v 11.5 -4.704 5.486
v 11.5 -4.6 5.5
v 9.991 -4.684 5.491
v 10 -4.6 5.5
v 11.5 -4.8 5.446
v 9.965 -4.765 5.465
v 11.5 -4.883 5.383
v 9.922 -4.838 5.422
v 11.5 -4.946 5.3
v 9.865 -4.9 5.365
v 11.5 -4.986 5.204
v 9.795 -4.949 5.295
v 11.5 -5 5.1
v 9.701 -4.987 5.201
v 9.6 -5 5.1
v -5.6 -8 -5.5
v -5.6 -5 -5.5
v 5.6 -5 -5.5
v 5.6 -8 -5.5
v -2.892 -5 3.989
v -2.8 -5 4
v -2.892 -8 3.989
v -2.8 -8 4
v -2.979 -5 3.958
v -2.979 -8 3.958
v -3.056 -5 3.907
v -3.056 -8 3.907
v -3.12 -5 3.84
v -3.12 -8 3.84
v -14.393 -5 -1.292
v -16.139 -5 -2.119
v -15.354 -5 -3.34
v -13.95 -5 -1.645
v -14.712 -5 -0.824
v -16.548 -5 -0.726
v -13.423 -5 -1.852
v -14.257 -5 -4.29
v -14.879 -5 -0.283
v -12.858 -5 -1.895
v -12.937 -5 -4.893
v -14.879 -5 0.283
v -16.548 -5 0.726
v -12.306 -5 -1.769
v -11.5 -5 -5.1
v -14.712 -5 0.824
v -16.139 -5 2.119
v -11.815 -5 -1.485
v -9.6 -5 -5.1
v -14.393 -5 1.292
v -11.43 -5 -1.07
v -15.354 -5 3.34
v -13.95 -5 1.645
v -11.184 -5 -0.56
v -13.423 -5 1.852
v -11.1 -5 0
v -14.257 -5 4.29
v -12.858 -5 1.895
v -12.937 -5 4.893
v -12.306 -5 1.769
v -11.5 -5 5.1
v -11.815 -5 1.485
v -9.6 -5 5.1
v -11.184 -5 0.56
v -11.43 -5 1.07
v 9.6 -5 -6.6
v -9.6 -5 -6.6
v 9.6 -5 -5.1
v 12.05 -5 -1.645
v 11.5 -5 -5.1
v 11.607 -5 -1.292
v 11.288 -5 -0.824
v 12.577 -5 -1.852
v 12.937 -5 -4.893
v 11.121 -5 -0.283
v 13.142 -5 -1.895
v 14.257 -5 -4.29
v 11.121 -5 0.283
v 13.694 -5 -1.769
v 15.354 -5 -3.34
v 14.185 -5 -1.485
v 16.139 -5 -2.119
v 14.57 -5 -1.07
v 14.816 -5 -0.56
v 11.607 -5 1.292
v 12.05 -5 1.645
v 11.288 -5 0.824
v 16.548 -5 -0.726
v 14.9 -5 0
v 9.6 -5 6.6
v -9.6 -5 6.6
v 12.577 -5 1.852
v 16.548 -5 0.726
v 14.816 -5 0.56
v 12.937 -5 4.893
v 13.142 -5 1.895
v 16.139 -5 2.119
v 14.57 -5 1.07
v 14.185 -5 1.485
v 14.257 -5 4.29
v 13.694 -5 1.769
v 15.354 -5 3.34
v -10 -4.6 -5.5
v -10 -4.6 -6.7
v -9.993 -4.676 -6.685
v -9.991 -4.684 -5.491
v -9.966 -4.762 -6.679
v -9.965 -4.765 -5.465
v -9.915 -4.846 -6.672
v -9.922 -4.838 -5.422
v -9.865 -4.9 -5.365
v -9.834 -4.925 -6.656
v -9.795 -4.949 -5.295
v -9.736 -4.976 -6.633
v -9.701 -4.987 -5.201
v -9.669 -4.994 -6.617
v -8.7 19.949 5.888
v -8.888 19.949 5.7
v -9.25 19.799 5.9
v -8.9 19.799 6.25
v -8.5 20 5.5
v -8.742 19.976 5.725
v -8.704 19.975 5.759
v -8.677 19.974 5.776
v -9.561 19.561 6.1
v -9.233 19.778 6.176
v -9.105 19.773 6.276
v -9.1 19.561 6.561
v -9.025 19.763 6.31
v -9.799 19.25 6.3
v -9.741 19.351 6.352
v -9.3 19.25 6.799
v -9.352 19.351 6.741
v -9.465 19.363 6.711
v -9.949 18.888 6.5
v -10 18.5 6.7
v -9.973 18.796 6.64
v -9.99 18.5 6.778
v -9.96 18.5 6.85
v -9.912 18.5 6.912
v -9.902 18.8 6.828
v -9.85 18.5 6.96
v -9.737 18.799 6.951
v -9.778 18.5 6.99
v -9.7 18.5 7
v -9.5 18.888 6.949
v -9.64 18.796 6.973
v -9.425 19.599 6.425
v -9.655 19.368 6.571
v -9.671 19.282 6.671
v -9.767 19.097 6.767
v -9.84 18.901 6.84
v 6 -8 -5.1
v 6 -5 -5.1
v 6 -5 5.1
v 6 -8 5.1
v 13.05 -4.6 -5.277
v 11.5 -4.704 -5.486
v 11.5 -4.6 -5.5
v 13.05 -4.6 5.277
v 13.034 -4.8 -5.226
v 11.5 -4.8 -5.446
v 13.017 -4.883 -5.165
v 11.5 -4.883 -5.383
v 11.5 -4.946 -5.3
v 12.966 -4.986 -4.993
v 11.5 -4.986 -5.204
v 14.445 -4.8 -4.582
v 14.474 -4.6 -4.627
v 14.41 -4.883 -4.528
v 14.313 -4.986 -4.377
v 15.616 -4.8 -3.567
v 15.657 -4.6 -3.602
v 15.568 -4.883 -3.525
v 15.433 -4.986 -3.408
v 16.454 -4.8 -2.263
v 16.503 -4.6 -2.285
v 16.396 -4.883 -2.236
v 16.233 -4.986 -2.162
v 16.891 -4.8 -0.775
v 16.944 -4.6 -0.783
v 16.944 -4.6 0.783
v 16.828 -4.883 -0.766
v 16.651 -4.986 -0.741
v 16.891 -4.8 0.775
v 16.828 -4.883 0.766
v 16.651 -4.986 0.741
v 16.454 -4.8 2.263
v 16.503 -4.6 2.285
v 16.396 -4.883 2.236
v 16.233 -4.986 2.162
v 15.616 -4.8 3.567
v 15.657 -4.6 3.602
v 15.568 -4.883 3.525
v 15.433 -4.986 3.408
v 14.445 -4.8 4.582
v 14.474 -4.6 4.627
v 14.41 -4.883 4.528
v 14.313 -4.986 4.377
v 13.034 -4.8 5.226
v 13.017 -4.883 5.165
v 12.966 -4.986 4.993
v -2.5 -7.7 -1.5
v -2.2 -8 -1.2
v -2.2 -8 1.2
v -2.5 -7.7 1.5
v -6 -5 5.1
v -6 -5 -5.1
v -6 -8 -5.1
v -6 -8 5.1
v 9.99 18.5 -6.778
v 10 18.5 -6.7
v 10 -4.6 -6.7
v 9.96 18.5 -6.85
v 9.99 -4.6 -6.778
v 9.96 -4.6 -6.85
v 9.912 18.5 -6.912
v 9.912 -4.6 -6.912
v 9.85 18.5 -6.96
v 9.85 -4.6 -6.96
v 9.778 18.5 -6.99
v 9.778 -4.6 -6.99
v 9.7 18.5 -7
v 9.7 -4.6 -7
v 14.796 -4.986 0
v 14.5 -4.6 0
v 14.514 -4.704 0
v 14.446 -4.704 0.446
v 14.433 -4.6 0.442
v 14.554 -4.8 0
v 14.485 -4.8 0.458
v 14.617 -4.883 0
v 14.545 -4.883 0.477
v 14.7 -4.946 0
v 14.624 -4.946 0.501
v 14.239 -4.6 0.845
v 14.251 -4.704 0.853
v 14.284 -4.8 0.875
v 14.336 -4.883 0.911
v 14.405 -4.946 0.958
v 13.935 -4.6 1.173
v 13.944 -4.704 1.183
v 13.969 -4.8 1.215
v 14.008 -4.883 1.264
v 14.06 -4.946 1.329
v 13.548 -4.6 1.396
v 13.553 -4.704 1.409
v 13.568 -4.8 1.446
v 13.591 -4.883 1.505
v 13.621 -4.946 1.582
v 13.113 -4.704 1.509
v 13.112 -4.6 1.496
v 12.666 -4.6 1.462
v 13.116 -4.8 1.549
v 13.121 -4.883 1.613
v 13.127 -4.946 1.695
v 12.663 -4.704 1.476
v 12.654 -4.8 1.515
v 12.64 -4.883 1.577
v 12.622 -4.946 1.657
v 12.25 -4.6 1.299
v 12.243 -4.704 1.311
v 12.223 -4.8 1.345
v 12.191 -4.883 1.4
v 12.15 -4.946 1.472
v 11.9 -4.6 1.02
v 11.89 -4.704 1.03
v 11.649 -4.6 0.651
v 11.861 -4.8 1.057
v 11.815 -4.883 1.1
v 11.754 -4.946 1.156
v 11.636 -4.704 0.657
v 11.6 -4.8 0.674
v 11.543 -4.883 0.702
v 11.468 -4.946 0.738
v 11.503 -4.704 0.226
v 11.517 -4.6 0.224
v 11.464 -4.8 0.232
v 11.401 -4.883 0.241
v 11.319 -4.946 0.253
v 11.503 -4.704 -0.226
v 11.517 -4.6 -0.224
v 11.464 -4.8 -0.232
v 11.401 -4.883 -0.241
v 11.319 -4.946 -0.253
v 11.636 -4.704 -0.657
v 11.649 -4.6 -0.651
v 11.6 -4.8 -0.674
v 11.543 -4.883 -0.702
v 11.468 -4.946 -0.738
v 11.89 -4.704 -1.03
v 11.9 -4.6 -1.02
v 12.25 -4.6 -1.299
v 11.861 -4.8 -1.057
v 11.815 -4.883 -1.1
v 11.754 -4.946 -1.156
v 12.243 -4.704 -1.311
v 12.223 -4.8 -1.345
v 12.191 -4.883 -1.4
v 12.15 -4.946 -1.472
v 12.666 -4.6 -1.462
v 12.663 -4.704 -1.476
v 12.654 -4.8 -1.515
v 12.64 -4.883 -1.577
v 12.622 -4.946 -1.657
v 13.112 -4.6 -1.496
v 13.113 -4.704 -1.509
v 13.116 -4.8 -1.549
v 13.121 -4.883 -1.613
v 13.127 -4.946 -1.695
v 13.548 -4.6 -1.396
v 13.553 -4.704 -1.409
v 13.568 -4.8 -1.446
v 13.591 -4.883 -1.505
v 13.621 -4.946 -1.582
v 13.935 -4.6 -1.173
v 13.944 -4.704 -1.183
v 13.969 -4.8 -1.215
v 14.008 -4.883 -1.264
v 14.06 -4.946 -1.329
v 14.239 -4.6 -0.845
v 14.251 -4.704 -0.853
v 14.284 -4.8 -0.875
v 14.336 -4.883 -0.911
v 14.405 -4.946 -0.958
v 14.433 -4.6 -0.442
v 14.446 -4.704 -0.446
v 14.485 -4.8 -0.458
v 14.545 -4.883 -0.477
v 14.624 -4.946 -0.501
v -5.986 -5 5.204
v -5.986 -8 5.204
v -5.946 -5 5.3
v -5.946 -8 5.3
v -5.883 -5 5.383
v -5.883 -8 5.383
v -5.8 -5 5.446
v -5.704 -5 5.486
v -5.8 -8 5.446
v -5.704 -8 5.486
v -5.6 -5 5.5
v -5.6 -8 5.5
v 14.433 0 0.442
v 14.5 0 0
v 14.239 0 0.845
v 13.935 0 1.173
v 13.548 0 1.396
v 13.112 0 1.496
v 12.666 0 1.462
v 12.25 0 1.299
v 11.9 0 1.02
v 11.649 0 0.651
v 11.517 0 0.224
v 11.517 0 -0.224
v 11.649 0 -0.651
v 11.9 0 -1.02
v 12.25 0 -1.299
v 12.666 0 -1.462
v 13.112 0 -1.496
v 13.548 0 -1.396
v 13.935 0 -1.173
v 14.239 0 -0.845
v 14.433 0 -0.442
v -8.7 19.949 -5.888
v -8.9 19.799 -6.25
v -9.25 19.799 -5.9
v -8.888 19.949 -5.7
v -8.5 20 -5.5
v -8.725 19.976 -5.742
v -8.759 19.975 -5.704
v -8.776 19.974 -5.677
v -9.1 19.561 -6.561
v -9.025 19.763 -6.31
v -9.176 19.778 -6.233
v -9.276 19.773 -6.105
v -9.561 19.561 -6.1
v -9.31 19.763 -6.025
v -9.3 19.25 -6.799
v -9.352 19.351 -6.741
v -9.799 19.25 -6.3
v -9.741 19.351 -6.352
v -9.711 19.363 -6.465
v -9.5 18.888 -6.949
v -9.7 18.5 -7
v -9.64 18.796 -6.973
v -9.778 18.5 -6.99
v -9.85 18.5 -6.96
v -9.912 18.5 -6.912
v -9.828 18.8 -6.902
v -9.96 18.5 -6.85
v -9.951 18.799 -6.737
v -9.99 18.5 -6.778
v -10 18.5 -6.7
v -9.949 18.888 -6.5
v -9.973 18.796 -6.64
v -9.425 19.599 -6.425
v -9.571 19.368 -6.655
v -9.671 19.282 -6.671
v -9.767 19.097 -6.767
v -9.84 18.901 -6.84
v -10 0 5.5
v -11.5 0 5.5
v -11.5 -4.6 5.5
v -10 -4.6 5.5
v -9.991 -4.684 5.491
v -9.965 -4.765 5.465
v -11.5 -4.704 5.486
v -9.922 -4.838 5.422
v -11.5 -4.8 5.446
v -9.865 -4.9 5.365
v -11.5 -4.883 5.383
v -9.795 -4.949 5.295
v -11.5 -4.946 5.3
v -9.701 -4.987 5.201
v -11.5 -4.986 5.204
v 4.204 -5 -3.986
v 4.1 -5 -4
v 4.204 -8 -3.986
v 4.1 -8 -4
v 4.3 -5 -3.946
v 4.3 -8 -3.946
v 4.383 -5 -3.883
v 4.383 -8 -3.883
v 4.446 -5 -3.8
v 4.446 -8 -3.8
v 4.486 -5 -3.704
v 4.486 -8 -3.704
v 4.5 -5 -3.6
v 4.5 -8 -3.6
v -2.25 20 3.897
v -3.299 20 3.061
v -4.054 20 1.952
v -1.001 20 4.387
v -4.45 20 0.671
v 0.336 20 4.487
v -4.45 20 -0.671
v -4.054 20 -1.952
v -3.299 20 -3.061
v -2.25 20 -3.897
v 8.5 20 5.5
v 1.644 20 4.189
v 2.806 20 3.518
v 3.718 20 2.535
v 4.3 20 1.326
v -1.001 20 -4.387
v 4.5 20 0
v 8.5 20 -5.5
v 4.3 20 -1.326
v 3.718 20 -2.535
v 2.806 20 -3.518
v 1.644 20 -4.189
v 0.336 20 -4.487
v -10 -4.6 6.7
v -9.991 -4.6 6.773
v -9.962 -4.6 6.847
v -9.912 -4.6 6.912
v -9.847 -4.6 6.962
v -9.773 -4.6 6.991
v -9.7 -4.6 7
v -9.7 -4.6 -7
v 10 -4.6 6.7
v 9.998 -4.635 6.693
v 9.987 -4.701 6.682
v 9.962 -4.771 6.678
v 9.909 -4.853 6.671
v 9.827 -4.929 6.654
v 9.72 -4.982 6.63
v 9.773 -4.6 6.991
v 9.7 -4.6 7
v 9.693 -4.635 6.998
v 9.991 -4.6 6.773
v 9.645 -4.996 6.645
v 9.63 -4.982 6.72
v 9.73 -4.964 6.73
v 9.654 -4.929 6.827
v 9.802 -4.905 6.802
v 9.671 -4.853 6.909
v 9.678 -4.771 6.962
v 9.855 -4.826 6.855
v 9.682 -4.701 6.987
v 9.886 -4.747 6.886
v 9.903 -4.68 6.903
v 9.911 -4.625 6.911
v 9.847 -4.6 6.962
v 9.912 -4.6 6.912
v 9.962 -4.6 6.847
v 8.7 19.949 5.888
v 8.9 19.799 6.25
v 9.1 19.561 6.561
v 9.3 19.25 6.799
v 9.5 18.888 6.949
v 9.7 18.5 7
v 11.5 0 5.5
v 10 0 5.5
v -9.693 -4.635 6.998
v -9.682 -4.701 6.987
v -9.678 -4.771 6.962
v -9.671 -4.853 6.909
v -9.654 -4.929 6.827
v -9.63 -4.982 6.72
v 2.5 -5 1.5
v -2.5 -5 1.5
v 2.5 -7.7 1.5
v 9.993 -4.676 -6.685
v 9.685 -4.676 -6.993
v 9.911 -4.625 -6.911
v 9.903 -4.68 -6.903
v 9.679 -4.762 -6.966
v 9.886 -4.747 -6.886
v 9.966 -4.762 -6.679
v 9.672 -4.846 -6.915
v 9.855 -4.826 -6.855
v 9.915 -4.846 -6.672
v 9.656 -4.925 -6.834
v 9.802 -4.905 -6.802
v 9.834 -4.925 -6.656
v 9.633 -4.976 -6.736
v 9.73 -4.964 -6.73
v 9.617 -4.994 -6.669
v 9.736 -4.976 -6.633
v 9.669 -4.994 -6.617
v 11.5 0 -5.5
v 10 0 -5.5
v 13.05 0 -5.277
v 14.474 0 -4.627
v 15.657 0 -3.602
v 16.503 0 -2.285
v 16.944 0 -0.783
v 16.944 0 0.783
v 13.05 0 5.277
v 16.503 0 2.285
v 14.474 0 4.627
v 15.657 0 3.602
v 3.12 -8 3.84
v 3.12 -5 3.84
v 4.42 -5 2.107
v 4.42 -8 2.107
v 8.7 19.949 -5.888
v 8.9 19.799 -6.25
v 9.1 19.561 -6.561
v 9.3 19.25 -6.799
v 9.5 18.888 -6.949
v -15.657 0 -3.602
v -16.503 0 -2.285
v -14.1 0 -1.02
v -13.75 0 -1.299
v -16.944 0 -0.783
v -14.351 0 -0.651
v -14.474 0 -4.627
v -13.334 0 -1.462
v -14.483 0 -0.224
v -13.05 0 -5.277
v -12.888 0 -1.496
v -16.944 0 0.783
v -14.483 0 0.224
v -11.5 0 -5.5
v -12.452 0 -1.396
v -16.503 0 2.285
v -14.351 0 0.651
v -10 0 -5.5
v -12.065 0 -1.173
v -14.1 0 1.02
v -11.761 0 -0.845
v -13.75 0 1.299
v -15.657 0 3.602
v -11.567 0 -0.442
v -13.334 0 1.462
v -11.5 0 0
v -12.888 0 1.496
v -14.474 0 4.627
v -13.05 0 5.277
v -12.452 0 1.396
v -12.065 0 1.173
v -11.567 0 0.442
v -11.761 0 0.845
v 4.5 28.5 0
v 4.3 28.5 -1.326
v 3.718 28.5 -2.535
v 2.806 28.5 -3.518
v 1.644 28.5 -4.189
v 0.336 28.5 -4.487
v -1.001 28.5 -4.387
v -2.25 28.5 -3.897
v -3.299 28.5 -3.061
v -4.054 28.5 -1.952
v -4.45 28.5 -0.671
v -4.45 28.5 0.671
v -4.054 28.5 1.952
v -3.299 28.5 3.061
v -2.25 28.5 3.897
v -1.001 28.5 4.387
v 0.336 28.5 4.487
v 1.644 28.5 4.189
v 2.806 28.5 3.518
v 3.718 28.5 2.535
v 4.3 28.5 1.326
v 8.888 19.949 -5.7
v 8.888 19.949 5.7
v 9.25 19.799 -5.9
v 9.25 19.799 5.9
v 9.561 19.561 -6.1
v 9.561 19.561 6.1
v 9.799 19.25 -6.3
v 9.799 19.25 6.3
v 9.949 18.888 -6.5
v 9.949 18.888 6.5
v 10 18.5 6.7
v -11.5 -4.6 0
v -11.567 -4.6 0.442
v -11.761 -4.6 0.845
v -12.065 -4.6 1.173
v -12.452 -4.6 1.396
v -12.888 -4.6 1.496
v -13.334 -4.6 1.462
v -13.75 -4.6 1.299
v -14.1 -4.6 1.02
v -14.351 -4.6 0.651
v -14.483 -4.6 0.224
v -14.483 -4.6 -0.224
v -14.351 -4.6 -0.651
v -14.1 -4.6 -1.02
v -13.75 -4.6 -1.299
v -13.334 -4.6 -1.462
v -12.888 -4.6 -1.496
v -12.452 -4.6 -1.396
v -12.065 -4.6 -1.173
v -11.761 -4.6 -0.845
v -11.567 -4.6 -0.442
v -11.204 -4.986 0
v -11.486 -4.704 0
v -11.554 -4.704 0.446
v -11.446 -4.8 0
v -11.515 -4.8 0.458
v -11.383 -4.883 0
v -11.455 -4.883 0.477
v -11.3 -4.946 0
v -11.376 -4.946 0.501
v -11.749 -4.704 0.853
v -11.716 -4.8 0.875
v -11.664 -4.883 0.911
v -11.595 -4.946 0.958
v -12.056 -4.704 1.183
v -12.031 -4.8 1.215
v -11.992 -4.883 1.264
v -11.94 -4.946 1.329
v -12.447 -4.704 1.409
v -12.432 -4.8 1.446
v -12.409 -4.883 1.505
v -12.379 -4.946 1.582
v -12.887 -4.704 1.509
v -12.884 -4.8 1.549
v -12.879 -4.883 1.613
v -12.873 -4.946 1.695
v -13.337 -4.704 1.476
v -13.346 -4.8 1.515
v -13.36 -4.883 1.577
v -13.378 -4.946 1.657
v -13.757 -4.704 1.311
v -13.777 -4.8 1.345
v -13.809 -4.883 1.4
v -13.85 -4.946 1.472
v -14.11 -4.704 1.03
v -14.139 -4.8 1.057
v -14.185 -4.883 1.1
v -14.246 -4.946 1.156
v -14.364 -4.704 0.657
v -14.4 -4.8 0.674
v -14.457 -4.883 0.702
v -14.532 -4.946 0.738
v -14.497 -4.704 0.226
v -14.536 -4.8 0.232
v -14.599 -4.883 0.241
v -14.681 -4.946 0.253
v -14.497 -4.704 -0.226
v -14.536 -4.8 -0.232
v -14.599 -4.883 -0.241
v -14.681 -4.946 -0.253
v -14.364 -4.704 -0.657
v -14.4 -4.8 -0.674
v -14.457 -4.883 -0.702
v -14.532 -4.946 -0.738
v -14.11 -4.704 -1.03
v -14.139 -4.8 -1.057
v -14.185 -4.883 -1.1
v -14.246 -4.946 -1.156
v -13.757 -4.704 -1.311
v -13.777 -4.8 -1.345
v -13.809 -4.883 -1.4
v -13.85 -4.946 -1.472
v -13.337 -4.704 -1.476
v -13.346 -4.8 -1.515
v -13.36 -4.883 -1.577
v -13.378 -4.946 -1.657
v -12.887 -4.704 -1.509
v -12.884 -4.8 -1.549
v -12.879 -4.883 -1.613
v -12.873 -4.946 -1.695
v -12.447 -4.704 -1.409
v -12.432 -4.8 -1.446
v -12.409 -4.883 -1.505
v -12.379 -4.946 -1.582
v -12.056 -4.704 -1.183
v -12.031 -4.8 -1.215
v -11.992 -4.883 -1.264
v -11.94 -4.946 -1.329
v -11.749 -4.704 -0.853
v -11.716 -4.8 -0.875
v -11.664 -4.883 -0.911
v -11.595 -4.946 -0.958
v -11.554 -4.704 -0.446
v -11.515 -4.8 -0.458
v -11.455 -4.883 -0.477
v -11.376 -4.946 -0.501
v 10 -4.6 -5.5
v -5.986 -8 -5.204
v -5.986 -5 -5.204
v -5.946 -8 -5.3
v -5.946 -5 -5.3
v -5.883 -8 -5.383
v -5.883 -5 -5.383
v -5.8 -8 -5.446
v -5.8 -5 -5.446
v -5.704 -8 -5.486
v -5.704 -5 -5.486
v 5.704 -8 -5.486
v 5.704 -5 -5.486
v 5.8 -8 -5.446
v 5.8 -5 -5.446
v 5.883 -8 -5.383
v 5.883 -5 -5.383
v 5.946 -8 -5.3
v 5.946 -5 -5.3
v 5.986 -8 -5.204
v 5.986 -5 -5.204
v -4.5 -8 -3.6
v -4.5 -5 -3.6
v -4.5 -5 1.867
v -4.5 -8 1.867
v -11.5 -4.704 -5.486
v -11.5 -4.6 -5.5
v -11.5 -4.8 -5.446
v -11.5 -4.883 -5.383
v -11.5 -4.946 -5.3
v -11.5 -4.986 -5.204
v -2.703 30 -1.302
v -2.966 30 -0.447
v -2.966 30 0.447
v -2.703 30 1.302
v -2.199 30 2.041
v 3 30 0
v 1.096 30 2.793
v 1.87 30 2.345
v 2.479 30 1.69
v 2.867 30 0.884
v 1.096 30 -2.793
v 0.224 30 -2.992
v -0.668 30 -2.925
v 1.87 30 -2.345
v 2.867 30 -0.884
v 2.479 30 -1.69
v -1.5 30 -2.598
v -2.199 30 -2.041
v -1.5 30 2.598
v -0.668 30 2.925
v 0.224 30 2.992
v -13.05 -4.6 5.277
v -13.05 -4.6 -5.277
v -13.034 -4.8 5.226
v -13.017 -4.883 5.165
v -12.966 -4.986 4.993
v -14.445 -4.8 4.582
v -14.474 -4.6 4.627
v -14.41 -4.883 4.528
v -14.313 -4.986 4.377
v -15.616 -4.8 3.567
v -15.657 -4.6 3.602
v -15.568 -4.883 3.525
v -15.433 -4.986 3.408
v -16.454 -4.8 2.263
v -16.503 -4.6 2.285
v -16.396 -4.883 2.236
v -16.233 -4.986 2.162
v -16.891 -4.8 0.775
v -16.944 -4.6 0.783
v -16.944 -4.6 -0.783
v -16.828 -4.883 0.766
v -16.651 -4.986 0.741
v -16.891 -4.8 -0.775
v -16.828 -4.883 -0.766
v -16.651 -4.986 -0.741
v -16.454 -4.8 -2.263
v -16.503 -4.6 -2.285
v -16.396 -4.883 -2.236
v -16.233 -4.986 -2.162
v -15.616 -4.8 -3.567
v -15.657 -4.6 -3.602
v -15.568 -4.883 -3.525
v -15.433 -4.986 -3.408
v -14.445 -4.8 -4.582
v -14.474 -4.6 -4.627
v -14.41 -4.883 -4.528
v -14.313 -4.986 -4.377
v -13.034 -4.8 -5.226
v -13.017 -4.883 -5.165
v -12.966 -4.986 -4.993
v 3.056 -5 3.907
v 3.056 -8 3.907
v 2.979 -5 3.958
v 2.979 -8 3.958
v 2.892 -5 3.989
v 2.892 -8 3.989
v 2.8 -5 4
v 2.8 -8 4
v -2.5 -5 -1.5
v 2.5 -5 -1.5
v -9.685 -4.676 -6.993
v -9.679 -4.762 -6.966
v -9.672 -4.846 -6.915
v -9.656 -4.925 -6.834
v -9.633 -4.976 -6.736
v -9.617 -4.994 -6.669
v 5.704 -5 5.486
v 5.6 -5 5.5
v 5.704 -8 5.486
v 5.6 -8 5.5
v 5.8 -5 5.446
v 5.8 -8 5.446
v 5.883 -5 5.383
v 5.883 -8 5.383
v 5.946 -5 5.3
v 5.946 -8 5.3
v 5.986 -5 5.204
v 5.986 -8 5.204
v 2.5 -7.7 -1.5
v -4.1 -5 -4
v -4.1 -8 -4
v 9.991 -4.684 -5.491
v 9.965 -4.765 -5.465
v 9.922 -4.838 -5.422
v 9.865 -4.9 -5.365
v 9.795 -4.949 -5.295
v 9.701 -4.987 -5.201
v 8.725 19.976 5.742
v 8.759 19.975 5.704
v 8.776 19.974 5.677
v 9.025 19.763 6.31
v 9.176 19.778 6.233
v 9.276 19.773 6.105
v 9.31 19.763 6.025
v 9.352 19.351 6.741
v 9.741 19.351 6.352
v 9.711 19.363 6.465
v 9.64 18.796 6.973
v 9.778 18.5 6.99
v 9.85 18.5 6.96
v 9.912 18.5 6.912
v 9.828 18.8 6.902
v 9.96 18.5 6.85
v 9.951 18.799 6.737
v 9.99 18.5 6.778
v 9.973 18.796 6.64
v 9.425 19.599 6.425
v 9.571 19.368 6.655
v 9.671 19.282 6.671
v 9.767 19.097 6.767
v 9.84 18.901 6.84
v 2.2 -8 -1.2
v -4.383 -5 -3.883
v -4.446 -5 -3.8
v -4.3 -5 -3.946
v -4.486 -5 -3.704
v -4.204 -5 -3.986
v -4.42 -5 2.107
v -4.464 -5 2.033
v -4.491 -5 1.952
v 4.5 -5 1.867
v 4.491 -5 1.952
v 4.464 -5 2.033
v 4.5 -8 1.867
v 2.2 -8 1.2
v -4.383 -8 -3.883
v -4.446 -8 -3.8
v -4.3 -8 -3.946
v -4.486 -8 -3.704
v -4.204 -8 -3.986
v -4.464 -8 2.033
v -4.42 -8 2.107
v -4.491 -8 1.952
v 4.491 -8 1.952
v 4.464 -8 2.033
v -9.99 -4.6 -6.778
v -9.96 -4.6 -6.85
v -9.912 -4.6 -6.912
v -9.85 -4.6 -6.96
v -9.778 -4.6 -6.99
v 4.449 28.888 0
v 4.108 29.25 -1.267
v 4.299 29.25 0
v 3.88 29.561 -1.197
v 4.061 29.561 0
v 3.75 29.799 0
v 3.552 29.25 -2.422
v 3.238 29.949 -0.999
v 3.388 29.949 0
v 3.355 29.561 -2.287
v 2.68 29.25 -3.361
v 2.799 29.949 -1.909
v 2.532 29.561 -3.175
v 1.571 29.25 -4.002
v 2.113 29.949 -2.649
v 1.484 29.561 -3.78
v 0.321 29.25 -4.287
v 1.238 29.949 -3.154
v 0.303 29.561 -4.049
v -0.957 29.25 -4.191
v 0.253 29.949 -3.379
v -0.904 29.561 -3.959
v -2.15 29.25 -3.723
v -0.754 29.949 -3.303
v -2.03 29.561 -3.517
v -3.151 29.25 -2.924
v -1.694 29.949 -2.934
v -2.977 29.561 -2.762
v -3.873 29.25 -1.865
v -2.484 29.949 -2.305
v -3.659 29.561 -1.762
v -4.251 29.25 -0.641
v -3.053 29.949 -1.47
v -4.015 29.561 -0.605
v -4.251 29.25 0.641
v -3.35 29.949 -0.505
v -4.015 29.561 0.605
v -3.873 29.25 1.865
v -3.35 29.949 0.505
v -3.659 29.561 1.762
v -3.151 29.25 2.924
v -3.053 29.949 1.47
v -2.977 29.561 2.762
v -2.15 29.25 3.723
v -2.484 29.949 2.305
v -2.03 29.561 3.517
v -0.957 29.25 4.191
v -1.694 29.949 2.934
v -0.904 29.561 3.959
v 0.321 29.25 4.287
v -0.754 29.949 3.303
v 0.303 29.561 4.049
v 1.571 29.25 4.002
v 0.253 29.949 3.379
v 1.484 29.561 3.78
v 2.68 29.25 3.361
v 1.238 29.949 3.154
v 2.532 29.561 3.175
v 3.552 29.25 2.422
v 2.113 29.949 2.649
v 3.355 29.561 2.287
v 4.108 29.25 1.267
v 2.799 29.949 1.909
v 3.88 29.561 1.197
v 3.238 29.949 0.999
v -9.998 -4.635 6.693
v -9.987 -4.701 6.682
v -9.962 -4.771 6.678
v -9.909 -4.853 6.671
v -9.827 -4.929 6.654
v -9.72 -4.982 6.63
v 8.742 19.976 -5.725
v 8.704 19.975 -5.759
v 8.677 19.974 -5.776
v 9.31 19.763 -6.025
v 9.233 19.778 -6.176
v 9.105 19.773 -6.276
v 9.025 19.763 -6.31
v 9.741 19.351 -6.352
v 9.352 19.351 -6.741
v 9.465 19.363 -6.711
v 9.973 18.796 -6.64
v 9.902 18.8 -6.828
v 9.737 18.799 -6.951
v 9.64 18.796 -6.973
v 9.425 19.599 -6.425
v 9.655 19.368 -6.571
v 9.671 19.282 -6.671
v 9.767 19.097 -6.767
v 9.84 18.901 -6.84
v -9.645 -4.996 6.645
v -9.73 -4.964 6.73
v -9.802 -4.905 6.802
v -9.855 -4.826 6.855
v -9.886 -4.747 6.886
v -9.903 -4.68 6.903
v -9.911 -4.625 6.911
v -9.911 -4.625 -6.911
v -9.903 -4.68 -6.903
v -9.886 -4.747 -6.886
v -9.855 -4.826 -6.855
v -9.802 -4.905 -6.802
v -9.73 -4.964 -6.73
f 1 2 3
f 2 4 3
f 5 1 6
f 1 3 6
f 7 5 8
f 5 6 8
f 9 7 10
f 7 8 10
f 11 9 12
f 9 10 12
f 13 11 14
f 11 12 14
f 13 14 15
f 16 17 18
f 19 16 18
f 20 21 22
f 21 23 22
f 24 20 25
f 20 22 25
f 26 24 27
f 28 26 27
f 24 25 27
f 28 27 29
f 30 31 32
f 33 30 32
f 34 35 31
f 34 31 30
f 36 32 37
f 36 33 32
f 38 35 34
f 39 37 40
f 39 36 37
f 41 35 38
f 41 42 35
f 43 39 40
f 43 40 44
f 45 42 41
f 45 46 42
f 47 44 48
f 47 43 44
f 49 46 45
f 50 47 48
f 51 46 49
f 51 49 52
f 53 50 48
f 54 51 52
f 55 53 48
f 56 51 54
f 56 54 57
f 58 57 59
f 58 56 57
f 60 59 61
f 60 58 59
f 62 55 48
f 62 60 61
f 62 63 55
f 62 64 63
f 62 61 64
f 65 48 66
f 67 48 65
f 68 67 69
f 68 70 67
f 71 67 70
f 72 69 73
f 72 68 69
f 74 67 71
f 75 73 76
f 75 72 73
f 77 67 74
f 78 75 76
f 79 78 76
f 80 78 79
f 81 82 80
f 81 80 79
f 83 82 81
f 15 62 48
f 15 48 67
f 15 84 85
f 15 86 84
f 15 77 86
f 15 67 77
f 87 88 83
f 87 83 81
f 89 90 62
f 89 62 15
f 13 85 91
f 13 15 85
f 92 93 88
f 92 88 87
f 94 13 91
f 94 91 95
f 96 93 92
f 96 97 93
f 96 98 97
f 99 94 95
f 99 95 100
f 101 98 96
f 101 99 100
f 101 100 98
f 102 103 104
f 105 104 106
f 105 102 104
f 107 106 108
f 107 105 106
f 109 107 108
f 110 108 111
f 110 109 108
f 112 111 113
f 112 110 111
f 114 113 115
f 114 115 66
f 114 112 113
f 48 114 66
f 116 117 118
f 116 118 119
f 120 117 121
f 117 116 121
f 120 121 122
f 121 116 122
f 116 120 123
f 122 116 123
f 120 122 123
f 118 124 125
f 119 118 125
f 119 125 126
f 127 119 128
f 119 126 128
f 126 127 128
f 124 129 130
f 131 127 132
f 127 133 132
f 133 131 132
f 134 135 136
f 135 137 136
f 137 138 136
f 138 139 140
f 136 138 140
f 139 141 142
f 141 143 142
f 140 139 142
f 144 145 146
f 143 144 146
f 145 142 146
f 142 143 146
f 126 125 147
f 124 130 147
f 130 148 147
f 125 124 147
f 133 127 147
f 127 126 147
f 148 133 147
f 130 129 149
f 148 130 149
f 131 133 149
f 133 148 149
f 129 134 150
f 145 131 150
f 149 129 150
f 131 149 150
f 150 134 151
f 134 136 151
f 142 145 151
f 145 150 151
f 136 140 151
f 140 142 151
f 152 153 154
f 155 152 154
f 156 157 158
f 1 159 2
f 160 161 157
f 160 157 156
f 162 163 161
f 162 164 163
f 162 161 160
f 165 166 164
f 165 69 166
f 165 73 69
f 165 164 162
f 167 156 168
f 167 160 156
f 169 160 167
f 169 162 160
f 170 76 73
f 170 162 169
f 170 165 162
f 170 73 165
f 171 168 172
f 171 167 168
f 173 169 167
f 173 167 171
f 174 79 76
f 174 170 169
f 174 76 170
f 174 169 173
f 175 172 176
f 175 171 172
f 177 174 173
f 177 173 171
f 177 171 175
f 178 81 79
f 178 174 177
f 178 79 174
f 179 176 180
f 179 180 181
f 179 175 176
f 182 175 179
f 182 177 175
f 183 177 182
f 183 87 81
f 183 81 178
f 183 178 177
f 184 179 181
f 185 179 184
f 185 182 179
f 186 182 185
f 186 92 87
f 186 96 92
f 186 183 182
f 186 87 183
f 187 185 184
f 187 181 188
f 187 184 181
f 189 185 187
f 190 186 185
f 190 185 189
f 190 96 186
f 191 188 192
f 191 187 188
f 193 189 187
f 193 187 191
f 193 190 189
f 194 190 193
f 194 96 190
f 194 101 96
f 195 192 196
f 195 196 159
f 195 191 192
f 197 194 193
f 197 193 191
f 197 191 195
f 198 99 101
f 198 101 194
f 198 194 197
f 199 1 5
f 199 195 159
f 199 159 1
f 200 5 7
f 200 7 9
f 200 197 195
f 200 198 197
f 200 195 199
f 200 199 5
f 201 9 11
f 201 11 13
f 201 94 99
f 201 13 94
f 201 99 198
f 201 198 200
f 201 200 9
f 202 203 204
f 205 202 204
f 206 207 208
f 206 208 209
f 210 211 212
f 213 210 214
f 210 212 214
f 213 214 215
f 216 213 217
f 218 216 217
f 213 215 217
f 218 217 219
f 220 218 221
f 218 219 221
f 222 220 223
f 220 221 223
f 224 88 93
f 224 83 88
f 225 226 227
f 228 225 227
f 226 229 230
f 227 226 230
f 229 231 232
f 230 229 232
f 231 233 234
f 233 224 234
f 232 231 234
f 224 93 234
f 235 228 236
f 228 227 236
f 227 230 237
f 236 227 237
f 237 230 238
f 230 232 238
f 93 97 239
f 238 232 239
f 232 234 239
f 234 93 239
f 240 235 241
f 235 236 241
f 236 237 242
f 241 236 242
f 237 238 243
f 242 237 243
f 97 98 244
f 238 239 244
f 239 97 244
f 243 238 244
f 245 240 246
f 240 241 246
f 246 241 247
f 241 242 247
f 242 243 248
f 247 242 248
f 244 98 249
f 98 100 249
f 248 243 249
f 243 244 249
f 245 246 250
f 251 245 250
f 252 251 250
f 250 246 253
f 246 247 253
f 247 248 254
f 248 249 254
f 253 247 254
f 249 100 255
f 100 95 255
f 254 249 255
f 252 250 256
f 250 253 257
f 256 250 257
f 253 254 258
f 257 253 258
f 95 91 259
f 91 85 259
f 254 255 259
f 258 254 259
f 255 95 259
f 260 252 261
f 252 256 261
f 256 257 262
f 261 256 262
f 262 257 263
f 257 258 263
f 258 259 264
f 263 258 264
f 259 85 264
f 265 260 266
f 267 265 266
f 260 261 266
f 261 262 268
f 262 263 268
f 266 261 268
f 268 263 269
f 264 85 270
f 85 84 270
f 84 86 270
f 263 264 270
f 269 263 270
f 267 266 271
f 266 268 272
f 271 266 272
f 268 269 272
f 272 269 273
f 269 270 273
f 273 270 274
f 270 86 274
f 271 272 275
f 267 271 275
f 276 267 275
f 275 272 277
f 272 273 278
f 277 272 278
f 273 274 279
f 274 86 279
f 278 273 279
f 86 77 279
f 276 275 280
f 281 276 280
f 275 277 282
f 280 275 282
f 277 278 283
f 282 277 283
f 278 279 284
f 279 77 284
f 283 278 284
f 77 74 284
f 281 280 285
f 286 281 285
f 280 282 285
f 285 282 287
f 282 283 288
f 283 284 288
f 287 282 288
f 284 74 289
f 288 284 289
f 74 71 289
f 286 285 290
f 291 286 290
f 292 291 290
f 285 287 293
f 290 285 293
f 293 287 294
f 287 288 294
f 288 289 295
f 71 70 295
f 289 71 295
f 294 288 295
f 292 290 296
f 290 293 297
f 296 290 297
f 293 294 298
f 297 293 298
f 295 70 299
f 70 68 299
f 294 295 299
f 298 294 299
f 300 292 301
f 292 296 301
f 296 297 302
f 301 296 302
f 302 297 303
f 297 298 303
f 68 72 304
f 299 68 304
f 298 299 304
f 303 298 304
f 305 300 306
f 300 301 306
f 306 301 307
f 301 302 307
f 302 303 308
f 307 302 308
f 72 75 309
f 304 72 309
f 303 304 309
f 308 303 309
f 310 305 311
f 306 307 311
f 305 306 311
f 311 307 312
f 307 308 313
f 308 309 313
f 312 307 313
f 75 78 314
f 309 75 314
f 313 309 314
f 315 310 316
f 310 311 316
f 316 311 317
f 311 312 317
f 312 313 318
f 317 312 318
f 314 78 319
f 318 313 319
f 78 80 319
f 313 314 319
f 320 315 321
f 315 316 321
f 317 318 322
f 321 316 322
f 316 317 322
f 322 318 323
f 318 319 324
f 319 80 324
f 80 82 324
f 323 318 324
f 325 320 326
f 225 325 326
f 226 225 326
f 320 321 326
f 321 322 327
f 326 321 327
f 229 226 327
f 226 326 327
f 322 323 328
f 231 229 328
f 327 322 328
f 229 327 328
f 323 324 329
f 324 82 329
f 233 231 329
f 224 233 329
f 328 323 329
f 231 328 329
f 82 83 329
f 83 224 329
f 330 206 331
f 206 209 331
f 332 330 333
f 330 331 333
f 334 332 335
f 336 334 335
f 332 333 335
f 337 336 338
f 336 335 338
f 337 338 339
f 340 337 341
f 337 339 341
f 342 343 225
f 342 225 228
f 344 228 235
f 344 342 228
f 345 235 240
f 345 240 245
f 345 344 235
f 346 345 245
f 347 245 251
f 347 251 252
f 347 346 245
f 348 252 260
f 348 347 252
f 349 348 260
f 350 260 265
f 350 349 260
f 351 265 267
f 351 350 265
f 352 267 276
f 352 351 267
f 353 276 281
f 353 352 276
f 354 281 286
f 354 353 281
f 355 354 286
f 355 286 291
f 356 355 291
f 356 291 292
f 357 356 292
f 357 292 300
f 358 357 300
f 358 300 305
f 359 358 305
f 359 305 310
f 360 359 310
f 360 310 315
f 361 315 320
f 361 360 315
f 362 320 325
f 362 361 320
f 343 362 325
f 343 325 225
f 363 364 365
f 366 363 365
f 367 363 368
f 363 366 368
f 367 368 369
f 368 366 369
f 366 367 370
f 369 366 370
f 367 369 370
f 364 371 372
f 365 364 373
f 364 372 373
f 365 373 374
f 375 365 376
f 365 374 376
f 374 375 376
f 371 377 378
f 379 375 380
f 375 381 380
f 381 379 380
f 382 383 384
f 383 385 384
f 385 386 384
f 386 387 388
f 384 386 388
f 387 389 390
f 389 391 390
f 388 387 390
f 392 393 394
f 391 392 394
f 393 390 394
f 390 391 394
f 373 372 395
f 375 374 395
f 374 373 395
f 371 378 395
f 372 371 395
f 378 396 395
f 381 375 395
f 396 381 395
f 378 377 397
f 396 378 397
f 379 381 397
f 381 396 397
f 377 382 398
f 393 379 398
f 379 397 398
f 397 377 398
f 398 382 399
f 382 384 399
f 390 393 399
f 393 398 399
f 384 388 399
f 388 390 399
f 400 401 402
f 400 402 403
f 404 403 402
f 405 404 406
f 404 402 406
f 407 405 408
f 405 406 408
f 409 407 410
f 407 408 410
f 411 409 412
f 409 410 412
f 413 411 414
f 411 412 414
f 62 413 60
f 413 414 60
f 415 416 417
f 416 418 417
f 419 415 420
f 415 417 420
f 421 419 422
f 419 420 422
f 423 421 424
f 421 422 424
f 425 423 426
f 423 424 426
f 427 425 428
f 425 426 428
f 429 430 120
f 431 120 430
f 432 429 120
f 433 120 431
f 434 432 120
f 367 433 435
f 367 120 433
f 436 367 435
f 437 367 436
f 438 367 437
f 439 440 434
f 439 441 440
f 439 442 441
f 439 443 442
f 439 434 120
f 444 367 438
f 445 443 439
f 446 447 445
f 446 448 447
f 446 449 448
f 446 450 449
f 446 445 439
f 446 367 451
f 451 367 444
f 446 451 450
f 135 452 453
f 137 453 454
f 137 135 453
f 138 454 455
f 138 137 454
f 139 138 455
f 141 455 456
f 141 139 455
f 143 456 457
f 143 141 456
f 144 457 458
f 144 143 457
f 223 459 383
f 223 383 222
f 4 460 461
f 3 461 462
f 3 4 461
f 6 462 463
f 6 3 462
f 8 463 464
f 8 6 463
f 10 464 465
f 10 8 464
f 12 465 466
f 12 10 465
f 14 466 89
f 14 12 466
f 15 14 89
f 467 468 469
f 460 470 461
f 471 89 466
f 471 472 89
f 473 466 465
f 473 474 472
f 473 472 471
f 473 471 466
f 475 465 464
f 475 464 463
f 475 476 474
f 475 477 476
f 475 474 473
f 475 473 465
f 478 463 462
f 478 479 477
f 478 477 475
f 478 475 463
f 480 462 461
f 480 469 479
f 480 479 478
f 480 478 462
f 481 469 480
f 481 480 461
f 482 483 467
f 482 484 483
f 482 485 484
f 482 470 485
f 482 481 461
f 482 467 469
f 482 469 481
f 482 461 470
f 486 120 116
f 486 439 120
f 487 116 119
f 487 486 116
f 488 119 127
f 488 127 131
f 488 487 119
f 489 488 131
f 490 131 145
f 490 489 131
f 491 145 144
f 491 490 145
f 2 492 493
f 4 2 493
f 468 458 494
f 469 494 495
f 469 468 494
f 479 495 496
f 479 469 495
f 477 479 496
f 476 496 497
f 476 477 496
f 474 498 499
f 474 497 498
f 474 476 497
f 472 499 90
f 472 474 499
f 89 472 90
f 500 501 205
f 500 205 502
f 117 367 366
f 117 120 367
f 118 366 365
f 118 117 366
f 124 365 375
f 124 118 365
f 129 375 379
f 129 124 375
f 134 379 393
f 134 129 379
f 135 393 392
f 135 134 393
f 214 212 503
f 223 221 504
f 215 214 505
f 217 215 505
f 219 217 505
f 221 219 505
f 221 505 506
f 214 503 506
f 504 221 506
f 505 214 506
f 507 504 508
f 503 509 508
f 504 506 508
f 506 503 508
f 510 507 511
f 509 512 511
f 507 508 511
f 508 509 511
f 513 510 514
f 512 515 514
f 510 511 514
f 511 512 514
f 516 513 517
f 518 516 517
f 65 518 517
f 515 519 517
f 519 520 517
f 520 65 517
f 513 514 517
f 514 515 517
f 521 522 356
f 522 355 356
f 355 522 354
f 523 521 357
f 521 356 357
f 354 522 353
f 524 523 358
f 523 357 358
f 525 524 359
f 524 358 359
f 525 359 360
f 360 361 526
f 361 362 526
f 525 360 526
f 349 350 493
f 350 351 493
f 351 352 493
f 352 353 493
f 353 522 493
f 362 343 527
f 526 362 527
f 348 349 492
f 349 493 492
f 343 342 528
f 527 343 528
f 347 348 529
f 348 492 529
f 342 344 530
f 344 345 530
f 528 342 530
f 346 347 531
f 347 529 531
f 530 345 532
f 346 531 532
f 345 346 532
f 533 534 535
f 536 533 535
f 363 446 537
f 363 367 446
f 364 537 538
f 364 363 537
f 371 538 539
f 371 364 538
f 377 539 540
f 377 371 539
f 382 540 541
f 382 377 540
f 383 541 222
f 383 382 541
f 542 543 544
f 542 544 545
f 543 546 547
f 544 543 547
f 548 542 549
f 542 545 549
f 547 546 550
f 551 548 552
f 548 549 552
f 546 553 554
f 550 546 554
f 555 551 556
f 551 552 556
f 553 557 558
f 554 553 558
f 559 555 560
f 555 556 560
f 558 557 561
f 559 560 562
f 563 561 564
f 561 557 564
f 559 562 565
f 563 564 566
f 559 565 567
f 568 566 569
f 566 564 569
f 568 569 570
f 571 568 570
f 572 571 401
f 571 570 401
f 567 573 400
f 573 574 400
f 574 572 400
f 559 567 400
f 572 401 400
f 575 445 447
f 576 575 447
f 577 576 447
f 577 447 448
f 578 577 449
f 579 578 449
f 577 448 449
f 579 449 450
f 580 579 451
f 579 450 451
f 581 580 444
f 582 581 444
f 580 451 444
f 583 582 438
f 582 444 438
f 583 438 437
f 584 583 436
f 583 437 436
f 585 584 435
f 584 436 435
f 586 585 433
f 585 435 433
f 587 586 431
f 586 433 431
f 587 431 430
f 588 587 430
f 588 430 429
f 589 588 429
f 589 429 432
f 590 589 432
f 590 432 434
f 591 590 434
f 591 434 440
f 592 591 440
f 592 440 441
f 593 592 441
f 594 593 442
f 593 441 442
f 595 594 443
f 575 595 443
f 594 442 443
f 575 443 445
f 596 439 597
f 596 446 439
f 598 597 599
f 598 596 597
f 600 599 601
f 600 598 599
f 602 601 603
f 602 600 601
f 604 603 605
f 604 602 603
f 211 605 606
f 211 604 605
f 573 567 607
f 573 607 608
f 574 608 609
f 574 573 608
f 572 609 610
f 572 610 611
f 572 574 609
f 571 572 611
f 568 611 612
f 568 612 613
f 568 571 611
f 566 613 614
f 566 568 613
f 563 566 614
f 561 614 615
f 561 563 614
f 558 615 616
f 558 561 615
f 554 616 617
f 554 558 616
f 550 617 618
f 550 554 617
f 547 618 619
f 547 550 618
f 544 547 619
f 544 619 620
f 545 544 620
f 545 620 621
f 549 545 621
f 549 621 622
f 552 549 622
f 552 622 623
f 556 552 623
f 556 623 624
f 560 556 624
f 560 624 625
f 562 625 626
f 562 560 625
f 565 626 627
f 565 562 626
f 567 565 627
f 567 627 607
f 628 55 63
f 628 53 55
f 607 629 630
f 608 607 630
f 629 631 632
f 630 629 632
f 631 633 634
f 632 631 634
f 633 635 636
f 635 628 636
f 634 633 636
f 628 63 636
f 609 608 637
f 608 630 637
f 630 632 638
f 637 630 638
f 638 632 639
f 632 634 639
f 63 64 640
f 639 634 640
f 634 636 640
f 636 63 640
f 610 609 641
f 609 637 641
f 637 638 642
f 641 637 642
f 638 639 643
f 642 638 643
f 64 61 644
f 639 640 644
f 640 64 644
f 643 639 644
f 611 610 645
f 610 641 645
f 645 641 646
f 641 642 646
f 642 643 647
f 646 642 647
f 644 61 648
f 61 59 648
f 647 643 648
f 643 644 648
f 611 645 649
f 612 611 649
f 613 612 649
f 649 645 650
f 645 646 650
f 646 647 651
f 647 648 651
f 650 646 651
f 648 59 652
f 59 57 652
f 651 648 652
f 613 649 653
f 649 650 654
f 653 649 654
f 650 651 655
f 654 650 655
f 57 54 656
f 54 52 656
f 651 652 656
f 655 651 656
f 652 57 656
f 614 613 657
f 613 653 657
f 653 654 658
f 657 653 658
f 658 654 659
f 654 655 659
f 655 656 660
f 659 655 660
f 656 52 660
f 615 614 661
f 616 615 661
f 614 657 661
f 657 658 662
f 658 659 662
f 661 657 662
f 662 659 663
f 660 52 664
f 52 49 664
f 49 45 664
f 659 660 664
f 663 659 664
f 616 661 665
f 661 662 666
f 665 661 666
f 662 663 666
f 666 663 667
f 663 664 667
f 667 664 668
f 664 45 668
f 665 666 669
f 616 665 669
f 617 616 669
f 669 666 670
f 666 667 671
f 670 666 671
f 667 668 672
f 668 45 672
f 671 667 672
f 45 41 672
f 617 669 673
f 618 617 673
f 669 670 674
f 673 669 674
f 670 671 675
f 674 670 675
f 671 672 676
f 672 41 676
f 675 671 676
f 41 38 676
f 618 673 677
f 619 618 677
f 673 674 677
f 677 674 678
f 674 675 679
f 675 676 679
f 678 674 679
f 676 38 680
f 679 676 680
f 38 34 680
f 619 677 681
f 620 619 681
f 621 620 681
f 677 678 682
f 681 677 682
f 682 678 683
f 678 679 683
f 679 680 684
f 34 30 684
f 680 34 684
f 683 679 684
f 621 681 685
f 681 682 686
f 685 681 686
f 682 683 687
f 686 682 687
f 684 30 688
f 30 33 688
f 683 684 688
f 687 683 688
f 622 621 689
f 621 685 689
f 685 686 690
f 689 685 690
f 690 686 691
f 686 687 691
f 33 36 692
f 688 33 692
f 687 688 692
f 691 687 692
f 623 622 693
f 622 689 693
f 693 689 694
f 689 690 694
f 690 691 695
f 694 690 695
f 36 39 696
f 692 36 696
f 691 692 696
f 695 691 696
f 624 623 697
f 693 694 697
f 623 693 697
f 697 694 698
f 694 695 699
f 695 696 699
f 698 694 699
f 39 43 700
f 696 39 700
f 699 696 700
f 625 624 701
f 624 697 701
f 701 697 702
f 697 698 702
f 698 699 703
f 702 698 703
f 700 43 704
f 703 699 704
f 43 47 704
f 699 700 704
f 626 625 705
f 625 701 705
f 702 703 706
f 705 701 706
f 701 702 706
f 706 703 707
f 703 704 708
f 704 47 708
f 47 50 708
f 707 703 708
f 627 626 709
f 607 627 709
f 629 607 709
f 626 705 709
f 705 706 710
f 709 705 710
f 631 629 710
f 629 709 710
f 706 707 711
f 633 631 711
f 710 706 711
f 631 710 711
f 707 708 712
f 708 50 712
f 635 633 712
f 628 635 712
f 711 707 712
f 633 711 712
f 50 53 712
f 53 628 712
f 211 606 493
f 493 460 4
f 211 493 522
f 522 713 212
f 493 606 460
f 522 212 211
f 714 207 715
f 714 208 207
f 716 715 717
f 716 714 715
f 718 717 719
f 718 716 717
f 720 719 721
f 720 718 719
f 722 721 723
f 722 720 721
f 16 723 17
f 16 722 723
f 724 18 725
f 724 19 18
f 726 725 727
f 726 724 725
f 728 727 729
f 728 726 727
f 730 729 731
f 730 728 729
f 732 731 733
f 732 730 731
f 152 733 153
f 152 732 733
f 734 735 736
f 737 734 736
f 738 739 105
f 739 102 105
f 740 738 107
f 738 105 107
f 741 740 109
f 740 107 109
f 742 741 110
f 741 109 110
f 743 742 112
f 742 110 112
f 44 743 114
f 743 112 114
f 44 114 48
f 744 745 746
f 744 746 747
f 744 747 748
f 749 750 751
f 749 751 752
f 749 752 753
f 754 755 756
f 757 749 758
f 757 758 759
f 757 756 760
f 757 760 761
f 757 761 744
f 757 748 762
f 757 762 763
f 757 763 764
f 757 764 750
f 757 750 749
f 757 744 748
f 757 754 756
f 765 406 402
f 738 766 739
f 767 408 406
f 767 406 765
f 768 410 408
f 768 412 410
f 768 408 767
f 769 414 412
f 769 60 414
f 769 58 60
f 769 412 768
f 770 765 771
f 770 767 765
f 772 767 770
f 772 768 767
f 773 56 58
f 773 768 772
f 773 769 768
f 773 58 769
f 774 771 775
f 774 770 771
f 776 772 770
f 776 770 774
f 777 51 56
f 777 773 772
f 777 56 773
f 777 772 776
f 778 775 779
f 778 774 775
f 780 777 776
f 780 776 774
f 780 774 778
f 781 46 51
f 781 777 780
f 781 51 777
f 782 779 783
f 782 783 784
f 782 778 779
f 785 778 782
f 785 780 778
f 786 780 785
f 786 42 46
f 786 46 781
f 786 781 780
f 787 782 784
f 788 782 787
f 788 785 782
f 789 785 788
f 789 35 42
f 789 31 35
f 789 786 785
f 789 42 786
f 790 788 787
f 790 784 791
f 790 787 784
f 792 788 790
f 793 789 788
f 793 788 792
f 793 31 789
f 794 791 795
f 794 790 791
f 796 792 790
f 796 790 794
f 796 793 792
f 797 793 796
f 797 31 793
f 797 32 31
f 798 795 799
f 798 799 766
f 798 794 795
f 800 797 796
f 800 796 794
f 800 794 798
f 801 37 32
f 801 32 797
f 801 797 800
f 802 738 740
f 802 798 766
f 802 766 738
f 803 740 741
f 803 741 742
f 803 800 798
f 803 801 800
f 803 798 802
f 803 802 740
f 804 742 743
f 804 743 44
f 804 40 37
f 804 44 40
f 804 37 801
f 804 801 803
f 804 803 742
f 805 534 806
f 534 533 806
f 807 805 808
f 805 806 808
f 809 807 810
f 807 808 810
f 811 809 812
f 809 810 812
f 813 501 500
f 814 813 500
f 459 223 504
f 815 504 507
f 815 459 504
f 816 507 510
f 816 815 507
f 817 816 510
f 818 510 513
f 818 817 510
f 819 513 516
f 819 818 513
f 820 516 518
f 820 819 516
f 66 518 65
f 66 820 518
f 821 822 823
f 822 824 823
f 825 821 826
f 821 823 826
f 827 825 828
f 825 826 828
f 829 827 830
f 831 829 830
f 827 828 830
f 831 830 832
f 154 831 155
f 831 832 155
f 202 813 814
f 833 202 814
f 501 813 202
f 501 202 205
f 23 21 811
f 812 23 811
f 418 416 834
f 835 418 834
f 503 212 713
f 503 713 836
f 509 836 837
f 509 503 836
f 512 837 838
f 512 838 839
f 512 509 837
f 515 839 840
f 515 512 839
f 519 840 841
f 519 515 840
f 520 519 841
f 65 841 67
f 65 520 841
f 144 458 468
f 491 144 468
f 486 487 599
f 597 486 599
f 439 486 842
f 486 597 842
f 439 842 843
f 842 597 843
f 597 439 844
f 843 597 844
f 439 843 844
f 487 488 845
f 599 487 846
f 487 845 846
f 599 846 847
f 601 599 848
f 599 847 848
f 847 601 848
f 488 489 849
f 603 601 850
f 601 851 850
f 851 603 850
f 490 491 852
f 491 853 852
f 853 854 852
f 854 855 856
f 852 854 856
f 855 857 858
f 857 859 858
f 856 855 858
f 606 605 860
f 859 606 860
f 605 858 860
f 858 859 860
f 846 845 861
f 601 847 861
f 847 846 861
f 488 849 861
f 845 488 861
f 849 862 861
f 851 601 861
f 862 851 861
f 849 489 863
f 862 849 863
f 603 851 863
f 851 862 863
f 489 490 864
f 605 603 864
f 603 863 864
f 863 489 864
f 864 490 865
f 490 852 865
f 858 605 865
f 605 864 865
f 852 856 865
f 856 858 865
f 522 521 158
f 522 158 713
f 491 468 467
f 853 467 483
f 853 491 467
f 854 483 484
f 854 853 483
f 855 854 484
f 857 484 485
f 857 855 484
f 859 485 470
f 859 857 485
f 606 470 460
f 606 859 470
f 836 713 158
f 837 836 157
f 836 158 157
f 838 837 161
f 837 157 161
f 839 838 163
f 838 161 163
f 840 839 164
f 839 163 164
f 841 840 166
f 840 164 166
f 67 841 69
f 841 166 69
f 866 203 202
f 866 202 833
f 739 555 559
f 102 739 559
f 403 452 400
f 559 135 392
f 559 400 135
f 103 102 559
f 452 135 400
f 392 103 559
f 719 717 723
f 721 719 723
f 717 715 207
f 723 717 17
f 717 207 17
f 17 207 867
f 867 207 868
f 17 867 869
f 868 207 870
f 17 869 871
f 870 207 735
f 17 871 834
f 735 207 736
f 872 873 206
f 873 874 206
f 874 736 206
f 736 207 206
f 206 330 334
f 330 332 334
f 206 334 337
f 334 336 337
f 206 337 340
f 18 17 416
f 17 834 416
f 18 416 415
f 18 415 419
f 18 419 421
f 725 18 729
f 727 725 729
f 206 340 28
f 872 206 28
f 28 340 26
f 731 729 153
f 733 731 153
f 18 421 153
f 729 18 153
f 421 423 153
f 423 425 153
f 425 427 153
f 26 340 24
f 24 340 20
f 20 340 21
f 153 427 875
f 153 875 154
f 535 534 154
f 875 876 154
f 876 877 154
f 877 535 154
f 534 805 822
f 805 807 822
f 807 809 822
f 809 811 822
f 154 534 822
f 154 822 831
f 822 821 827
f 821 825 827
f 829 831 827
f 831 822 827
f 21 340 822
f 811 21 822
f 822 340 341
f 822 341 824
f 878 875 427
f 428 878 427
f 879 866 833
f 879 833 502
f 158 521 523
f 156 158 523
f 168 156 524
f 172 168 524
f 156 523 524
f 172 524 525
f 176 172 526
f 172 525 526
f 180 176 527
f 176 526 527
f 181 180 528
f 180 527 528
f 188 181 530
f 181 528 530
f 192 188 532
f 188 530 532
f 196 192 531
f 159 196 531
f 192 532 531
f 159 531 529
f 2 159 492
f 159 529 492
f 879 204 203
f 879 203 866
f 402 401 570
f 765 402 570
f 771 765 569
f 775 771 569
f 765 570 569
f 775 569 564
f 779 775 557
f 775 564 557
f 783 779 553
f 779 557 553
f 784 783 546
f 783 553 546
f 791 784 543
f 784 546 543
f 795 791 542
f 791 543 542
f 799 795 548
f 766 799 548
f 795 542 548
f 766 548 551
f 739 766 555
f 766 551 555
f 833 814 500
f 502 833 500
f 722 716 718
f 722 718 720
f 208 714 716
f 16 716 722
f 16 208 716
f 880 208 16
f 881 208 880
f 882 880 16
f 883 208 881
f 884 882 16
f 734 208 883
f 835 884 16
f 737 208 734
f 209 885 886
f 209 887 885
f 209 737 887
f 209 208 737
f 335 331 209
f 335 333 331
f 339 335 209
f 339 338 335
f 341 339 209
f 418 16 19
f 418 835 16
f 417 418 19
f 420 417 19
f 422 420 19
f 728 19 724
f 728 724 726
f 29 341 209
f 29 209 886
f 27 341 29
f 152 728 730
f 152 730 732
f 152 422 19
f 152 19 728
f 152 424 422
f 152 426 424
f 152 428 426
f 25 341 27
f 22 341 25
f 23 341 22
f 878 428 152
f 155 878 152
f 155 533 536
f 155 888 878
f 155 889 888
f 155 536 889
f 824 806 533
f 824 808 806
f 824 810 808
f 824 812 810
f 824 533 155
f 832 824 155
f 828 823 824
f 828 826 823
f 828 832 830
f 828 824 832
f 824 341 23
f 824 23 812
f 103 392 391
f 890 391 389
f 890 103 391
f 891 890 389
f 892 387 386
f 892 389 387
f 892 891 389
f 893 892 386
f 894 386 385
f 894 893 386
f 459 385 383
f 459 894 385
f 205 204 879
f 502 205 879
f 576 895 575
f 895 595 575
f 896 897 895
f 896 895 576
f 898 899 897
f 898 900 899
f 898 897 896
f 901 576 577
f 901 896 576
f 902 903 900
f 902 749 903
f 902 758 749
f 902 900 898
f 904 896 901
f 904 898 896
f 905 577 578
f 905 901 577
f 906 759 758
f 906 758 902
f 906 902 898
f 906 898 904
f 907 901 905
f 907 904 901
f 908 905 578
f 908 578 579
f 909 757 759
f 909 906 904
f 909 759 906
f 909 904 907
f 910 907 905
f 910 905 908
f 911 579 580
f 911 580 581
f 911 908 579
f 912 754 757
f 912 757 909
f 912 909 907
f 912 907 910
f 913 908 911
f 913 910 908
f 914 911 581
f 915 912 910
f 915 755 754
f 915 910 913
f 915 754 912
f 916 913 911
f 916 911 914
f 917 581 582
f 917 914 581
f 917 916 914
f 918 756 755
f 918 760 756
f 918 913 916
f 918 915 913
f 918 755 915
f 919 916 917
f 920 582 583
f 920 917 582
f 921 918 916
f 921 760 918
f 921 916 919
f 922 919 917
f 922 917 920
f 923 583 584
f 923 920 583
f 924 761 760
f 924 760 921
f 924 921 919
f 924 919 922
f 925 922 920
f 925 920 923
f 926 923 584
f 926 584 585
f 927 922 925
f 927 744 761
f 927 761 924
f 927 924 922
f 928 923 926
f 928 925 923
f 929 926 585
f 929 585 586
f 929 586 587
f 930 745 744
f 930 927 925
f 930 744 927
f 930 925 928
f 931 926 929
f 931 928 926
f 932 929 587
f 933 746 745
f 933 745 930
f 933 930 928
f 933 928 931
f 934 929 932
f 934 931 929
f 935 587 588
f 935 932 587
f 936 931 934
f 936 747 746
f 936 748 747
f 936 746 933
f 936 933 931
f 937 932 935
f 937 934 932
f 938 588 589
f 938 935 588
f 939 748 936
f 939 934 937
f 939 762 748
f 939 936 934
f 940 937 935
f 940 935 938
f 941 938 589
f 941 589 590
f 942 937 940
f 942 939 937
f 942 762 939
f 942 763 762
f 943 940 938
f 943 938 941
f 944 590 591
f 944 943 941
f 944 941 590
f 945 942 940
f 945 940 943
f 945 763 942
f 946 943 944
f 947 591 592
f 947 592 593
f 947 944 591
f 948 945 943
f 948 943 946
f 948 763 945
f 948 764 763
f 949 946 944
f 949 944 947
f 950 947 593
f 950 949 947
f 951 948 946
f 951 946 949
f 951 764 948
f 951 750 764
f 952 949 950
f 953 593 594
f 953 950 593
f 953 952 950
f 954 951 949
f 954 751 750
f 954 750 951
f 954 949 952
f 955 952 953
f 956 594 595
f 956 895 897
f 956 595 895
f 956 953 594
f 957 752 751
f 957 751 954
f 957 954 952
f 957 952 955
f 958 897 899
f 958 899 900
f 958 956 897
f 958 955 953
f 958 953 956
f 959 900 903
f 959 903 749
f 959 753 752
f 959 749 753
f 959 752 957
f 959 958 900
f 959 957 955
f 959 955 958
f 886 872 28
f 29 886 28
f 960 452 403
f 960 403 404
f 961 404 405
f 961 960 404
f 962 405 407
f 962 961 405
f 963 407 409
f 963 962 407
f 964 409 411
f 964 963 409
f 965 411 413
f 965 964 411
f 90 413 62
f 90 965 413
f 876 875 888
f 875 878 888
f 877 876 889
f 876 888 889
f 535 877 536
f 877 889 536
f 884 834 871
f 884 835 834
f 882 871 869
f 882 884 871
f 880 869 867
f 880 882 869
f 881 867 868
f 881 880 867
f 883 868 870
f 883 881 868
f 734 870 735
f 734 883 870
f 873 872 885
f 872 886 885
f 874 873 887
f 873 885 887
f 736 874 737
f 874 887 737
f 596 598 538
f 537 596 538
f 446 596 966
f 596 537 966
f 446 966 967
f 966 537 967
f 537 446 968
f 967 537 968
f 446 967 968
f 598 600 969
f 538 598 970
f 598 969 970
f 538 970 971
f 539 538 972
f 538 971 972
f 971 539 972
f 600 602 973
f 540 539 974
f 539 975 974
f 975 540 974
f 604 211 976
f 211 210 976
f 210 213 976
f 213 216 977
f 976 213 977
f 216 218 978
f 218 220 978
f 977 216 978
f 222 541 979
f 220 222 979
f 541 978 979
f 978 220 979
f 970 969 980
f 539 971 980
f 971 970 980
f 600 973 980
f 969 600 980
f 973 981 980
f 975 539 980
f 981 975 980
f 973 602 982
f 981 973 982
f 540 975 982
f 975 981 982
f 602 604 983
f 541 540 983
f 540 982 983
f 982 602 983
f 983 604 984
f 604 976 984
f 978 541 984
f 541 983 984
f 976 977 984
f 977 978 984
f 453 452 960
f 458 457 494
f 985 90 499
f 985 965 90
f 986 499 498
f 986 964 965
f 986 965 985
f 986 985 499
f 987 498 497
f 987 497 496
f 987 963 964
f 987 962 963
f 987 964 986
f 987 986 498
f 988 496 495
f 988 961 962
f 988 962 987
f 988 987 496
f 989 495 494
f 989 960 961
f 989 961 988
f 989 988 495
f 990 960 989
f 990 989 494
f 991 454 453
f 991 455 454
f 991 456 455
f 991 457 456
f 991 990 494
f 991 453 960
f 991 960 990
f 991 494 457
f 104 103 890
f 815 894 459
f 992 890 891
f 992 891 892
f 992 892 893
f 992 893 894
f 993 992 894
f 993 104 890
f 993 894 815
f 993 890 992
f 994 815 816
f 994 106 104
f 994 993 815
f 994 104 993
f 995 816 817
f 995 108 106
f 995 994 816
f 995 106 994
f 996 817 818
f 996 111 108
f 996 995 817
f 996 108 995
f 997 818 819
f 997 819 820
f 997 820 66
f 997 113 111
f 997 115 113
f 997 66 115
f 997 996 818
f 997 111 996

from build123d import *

# Parameters (mm, degrees)
SKETCH_R     = 1.5
PAD_DEPTH    = 5
FILLET_R     = 0.4
SKETCH001_W  = 20
SKETCH001_H  = 14
PAD001_DEPTH = 20
FILLET001_R  = 0.3
FILLET002_R  = 1.5
SKETCH005_R  = 4.5
PAD005_DEPTH = 10
FILLET005_R  = 1.5
SKETCH003_W  = 12
SKETCH003_H  = 11
PAD003_DEPTH = 3
FILLET004_R  = 0.4
SKETCH004_W  = 5
SKETCH004_H  = 3
PAD004_DEPTH = 3
CHAMFER_SIZE = 0.3


with BuildPart() as body:
    # Sketch → Pad (new body)
    with BuildSketch(Plane.XZ):
        with BuildLine():
            ThreePointArc((-11.5, 5.5), (-17, 0), (-11.5, -5.5))
            Line((-11.5, -5.5), (-10, -5.5))
            Line((-10, -7), (-10, -5.5))
            Line((10, -7), (-10, -7))
            Line((10, -5.5), (10, -7))
            Line((11.5, -5.5), (10, -5.5))
            ThreePointArc((11.5, -5.5), (17, 0), (11.5, 5.5))
            Line((11.5, 5.5), (10, 5.5))
            Line((10, 7), (10, 5.5))
            Line((-10, 7), (10, 7))
            Line((-10, 5.5), (-10, 7))
            Line((-11.5, 5.5), (-10, 5.5))
        make_face()
        with Locations((13, 0)):
            Circle(SKETCH_R, mode=Mode.SUBTRACT)
        with Locations((-13, 0)):
            Circle(SKETCH_R, mode=Mode.SUBTRACT)
    extrude(amount=PAD_DEPTH)

    # Fillet
    fillet_edges = [body.edges().sort_by_distance(p)[0] for p in [
        (17, -5, 0),
        (10.75, -5, 5.5),
        (0, -5, 7),
        (-17, -5, 0),
        (-10.75, -5, 5.5),
        (-10, -5, 6.25),
        (10, -5, 6.25),
        (10, -5, -6.25),
        (0, -5, -7),
        (10.75, -5, -5.5),
        (-10, -5, -6.25),
        (-10.75, -5, -5.5),
        (-14.5, -5, 0),
        (11.5, -5, 0),
    ]]
    fillet(fillet_edges, radius=FILLET_R)

    # Sketch001 (on Face4 of Fillet) → Pad001 (join)
    with BuildSketch(Plane(origin=(0, 0, 0), x_dir=(1, 0, 0), z_dir=(0, 1, 0))):
        Rectangle(SKETCH001_W, SKETCH001_H)
    extrude(amount=PAD001_DEPTH)

    # Fillet001
    fillet001_edges = [body.edges().sort_by_distance(p)[0] for p in [
        (10, 10, 7),
        (-10, 10, 7),
        (-10, 10, -7),
        (10, 10, -7),
    ]]
    fillet(fillet001_edges, radius=FILLET001_R)

    # Fillet002
    fillet002_edges = [body.edges().sort_by_distance(p)[0] for p in [
        (0, 20, 7),
        (10, 20, 0),
        (0, 20, -7),
        (-10, 20, 0),
    ]]
    fillet(fillet002_edges, radius=FILLET002_R)

    # Sketch005 (on Face13 of Fillet002) → Pad005 (join)
    with BuildSketch(Plane(origin=(0, 20, 0), x_dir=(1, 0, 0), z_dir=(0, 1, 0))):
        Circle(SKETCH005_R)
    extrude(amount=PAD005_DEPTH)

    # Fillet005
    fillet005_edges = [body.edges().sort_by_distance(p)[0] for p in [
        (-4.5, 30, 0),
    ]]
    fillet(fillet005_edges, radius=FILLET005_R)


with BuildPart() as body001:
    # Sketch003 → Pad003 (new body)
    with BuildSketch(Plane.XZ.offset(5)):
        Rectangle(SKETCH003_W, SKETCH003_H)
        Polygon((-4.5, -4), (-4.5, 2), (-3, 4), (3, 4), (4.5, 2), (4.5, -4), align=None, mode=Mode.SUBTRACT)
    extrude(amount=PAD003_DEPTH)

    # Fillet004
    fillet004_edges = [body001.edges().sort_by_distance(p)[0] for p in [
        (6, -6.5, 5.5),
        (-6, -6.5, 5.5),
        (-6, -6.5, -5.5),
        (6, -6.5, -5.5),
        (-4.5, -6.5, -4),
        (4.5, -6.5, -4),
        (-4.5, -6.5, 2),
        (-3, -6.5, 4),
        (3, -6.5, 4),
        (4.5, -6.5, 2),
    ]]
    fillet(fillet004_edges, radius=FILLET004_R)


with BuildPart() as body002:
    # Sketch004 → Pad004 (new body)
    with BuildSketch(Plane.XZ.offset(5)):
        Rectangle(SKETCH004_W, SKETCH004_H)
    extrude(amount=PAD004_DEPTH)

    # Chamfer
    chamfer_edges = [body002.edges().sort_by_distance(p)[0] for p in [
        (0, -8, 1.5),
        (2.5, -8, 0),
        (0, -8, -1.5),
        (-2.5, -8, 0),
    ]]
    chamfer(chamfer_edges, length=CHAMFER_SIZE)


solid = Compound([body.part, body001.part, body002.part])
